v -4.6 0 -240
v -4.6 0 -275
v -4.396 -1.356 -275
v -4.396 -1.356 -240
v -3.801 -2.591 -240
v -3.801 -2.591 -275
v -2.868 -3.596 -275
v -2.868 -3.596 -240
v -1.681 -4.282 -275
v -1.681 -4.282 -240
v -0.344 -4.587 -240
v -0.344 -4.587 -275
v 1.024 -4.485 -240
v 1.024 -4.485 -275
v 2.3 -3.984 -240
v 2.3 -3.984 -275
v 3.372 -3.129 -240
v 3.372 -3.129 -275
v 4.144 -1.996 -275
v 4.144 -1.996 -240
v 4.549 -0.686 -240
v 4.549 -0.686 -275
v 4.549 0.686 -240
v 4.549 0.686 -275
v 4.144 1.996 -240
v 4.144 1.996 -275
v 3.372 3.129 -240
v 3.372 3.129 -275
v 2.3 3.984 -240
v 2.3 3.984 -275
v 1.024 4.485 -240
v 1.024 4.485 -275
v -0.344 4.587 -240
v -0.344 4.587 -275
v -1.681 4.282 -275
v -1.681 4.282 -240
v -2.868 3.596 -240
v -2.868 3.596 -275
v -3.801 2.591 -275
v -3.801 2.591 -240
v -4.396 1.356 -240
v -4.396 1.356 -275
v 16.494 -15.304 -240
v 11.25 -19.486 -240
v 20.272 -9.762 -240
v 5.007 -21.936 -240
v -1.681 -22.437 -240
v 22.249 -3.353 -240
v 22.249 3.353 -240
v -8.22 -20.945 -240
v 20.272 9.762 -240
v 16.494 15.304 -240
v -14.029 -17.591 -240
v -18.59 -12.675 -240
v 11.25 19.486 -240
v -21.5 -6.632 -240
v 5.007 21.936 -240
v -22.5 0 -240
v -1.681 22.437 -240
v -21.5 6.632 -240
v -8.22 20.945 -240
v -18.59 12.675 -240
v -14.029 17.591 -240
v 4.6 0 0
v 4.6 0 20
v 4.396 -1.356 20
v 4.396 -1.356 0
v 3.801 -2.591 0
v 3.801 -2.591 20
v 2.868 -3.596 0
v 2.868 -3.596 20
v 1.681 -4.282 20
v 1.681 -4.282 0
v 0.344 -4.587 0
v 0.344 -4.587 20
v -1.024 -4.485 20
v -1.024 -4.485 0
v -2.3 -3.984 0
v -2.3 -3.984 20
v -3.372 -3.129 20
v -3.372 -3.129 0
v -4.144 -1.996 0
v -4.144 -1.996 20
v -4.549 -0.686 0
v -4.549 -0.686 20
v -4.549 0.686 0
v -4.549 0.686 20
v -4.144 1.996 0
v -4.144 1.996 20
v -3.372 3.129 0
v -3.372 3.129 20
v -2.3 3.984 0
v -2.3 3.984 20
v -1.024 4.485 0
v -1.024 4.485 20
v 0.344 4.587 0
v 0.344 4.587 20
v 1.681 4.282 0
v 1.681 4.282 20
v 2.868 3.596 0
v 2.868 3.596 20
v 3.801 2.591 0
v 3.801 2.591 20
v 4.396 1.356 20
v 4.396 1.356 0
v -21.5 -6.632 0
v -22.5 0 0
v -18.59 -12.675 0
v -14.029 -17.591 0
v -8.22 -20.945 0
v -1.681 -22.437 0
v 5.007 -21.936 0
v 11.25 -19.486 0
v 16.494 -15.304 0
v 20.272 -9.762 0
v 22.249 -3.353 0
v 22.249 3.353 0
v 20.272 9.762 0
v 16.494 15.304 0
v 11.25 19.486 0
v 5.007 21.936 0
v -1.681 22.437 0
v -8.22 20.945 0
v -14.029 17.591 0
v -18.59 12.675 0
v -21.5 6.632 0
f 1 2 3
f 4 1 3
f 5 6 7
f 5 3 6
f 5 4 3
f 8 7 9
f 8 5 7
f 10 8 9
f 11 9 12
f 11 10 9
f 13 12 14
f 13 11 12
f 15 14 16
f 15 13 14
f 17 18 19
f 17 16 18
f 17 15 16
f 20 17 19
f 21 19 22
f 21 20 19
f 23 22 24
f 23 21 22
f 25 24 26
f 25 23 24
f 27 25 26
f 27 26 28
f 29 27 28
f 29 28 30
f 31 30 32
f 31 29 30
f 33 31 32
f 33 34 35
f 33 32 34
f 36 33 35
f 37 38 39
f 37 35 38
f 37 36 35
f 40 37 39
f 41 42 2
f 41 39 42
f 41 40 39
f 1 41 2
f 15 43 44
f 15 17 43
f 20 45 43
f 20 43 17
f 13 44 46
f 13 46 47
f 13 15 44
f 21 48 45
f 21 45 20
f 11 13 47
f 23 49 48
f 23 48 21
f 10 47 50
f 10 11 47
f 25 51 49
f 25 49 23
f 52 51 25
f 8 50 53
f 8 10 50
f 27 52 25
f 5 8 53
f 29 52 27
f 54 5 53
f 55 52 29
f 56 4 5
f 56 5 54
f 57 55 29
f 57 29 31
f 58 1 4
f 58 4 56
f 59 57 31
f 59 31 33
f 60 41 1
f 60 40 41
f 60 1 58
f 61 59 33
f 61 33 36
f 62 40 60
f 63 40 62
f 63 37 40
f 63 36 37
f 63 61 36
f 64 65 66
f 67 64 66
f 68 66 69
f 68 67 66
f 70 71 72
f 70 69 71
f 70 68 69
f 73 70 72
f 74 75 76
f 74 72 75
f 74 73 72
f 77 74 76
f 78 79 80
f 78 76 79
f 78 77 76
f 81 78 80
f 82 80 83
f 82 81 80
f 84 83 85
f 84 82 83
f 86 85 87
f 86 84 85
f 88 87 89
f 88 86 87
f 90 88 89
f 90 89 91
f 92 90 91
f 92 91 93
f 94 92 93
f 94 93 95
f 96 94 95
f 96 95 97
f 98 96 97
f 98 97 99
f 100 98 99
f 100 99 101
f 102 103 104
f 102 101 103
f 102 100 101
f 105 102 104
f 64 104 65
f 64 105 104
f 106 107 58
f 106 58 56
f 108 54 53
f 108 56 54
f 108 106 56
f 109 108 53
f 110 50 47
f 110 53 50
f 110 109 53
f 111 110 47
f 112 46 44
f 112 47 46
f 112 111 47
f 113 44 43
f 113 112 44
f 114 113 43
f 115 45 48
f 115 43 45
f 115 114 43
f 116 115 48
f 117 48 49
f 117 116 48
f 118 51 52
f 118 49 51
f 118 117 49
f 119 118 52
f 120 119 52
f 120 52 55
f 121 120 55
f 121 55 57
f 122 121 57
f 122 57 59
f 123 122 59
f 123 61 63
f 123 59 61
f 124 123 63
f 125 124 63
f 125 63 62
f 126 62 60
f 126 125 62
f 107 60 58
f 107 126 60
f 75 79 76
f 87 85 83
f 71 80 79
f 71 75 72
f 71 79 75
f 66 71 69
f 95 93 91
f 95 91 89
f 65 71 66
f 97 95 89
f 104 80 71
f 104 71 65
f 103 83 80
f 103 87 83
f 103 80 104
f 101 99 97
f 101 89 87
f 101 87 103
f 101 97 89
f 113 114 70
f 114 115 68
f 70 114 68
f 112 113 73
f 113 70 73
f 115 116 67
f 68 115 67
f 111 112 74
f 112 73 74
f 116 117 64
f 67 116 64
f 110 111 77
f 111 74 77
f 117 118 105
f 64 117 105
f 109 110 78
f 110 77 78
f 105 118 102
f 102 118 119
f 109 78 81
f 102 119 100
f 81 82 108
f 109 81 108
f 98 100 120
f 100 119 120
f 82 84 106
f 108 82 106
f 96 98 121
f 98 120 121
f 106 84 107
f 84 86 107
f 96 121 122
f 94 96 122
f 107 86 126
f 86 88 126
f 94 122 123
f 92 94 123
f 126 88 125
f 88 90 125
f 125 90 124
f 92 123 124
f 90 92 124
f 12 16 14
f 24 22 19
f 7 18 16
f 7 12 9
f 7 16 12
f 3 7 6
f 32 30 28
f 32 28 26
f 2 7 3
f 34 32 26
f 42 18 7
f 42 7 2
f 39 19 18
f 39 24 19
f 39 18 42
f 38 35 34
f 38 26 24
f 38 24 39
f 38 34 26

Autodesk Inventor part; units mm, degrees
ref_plane "YZ Plane" through (0, 0, 0) normal (1, 0, 0) x (0, 1, 0)
ref_plane "XZ Plane" through (0, 0, 0) normal (0, 1, 0) x (-1, 0, 0)
ref_plane "XY Plane" through (0, 0, 0) normal (0, 0, 1) x (1, 0, 0)
sketch "草图1" plane through (0, 0, 0) normal (0, 0, 1) x (1, 0, 0)
  circle A0 centre (0, 0) radius 4.6
  dimension "d0" = 9.2
extrude "拉伸1" add sketch "草图1" along normal blind 20
sketch "草图2" plane through (0, 0, 0) normal (0, 0, -1) x (-1, 0, 0)
  circle A0 centre (0, 0) radius 4.6 projected
  circle A1 centre (0, 0) radius 22.5
  dimension "d3" = 45
extrude "拉伸2" add sketch "草图2" along normal blind 240 contours A0 | A1
sketch "草图3" plane through (0, 0, -240) normal (0, 0, -1) x (-1, 0, 0)
  circle A0 centre (0, 0) radius 4.6 projected
  circle A1 centre (0, 0) radius 4.6
extrude "拉伸3" add sketch "草图3" along normal blind 35
properties part number "滚轴1"
